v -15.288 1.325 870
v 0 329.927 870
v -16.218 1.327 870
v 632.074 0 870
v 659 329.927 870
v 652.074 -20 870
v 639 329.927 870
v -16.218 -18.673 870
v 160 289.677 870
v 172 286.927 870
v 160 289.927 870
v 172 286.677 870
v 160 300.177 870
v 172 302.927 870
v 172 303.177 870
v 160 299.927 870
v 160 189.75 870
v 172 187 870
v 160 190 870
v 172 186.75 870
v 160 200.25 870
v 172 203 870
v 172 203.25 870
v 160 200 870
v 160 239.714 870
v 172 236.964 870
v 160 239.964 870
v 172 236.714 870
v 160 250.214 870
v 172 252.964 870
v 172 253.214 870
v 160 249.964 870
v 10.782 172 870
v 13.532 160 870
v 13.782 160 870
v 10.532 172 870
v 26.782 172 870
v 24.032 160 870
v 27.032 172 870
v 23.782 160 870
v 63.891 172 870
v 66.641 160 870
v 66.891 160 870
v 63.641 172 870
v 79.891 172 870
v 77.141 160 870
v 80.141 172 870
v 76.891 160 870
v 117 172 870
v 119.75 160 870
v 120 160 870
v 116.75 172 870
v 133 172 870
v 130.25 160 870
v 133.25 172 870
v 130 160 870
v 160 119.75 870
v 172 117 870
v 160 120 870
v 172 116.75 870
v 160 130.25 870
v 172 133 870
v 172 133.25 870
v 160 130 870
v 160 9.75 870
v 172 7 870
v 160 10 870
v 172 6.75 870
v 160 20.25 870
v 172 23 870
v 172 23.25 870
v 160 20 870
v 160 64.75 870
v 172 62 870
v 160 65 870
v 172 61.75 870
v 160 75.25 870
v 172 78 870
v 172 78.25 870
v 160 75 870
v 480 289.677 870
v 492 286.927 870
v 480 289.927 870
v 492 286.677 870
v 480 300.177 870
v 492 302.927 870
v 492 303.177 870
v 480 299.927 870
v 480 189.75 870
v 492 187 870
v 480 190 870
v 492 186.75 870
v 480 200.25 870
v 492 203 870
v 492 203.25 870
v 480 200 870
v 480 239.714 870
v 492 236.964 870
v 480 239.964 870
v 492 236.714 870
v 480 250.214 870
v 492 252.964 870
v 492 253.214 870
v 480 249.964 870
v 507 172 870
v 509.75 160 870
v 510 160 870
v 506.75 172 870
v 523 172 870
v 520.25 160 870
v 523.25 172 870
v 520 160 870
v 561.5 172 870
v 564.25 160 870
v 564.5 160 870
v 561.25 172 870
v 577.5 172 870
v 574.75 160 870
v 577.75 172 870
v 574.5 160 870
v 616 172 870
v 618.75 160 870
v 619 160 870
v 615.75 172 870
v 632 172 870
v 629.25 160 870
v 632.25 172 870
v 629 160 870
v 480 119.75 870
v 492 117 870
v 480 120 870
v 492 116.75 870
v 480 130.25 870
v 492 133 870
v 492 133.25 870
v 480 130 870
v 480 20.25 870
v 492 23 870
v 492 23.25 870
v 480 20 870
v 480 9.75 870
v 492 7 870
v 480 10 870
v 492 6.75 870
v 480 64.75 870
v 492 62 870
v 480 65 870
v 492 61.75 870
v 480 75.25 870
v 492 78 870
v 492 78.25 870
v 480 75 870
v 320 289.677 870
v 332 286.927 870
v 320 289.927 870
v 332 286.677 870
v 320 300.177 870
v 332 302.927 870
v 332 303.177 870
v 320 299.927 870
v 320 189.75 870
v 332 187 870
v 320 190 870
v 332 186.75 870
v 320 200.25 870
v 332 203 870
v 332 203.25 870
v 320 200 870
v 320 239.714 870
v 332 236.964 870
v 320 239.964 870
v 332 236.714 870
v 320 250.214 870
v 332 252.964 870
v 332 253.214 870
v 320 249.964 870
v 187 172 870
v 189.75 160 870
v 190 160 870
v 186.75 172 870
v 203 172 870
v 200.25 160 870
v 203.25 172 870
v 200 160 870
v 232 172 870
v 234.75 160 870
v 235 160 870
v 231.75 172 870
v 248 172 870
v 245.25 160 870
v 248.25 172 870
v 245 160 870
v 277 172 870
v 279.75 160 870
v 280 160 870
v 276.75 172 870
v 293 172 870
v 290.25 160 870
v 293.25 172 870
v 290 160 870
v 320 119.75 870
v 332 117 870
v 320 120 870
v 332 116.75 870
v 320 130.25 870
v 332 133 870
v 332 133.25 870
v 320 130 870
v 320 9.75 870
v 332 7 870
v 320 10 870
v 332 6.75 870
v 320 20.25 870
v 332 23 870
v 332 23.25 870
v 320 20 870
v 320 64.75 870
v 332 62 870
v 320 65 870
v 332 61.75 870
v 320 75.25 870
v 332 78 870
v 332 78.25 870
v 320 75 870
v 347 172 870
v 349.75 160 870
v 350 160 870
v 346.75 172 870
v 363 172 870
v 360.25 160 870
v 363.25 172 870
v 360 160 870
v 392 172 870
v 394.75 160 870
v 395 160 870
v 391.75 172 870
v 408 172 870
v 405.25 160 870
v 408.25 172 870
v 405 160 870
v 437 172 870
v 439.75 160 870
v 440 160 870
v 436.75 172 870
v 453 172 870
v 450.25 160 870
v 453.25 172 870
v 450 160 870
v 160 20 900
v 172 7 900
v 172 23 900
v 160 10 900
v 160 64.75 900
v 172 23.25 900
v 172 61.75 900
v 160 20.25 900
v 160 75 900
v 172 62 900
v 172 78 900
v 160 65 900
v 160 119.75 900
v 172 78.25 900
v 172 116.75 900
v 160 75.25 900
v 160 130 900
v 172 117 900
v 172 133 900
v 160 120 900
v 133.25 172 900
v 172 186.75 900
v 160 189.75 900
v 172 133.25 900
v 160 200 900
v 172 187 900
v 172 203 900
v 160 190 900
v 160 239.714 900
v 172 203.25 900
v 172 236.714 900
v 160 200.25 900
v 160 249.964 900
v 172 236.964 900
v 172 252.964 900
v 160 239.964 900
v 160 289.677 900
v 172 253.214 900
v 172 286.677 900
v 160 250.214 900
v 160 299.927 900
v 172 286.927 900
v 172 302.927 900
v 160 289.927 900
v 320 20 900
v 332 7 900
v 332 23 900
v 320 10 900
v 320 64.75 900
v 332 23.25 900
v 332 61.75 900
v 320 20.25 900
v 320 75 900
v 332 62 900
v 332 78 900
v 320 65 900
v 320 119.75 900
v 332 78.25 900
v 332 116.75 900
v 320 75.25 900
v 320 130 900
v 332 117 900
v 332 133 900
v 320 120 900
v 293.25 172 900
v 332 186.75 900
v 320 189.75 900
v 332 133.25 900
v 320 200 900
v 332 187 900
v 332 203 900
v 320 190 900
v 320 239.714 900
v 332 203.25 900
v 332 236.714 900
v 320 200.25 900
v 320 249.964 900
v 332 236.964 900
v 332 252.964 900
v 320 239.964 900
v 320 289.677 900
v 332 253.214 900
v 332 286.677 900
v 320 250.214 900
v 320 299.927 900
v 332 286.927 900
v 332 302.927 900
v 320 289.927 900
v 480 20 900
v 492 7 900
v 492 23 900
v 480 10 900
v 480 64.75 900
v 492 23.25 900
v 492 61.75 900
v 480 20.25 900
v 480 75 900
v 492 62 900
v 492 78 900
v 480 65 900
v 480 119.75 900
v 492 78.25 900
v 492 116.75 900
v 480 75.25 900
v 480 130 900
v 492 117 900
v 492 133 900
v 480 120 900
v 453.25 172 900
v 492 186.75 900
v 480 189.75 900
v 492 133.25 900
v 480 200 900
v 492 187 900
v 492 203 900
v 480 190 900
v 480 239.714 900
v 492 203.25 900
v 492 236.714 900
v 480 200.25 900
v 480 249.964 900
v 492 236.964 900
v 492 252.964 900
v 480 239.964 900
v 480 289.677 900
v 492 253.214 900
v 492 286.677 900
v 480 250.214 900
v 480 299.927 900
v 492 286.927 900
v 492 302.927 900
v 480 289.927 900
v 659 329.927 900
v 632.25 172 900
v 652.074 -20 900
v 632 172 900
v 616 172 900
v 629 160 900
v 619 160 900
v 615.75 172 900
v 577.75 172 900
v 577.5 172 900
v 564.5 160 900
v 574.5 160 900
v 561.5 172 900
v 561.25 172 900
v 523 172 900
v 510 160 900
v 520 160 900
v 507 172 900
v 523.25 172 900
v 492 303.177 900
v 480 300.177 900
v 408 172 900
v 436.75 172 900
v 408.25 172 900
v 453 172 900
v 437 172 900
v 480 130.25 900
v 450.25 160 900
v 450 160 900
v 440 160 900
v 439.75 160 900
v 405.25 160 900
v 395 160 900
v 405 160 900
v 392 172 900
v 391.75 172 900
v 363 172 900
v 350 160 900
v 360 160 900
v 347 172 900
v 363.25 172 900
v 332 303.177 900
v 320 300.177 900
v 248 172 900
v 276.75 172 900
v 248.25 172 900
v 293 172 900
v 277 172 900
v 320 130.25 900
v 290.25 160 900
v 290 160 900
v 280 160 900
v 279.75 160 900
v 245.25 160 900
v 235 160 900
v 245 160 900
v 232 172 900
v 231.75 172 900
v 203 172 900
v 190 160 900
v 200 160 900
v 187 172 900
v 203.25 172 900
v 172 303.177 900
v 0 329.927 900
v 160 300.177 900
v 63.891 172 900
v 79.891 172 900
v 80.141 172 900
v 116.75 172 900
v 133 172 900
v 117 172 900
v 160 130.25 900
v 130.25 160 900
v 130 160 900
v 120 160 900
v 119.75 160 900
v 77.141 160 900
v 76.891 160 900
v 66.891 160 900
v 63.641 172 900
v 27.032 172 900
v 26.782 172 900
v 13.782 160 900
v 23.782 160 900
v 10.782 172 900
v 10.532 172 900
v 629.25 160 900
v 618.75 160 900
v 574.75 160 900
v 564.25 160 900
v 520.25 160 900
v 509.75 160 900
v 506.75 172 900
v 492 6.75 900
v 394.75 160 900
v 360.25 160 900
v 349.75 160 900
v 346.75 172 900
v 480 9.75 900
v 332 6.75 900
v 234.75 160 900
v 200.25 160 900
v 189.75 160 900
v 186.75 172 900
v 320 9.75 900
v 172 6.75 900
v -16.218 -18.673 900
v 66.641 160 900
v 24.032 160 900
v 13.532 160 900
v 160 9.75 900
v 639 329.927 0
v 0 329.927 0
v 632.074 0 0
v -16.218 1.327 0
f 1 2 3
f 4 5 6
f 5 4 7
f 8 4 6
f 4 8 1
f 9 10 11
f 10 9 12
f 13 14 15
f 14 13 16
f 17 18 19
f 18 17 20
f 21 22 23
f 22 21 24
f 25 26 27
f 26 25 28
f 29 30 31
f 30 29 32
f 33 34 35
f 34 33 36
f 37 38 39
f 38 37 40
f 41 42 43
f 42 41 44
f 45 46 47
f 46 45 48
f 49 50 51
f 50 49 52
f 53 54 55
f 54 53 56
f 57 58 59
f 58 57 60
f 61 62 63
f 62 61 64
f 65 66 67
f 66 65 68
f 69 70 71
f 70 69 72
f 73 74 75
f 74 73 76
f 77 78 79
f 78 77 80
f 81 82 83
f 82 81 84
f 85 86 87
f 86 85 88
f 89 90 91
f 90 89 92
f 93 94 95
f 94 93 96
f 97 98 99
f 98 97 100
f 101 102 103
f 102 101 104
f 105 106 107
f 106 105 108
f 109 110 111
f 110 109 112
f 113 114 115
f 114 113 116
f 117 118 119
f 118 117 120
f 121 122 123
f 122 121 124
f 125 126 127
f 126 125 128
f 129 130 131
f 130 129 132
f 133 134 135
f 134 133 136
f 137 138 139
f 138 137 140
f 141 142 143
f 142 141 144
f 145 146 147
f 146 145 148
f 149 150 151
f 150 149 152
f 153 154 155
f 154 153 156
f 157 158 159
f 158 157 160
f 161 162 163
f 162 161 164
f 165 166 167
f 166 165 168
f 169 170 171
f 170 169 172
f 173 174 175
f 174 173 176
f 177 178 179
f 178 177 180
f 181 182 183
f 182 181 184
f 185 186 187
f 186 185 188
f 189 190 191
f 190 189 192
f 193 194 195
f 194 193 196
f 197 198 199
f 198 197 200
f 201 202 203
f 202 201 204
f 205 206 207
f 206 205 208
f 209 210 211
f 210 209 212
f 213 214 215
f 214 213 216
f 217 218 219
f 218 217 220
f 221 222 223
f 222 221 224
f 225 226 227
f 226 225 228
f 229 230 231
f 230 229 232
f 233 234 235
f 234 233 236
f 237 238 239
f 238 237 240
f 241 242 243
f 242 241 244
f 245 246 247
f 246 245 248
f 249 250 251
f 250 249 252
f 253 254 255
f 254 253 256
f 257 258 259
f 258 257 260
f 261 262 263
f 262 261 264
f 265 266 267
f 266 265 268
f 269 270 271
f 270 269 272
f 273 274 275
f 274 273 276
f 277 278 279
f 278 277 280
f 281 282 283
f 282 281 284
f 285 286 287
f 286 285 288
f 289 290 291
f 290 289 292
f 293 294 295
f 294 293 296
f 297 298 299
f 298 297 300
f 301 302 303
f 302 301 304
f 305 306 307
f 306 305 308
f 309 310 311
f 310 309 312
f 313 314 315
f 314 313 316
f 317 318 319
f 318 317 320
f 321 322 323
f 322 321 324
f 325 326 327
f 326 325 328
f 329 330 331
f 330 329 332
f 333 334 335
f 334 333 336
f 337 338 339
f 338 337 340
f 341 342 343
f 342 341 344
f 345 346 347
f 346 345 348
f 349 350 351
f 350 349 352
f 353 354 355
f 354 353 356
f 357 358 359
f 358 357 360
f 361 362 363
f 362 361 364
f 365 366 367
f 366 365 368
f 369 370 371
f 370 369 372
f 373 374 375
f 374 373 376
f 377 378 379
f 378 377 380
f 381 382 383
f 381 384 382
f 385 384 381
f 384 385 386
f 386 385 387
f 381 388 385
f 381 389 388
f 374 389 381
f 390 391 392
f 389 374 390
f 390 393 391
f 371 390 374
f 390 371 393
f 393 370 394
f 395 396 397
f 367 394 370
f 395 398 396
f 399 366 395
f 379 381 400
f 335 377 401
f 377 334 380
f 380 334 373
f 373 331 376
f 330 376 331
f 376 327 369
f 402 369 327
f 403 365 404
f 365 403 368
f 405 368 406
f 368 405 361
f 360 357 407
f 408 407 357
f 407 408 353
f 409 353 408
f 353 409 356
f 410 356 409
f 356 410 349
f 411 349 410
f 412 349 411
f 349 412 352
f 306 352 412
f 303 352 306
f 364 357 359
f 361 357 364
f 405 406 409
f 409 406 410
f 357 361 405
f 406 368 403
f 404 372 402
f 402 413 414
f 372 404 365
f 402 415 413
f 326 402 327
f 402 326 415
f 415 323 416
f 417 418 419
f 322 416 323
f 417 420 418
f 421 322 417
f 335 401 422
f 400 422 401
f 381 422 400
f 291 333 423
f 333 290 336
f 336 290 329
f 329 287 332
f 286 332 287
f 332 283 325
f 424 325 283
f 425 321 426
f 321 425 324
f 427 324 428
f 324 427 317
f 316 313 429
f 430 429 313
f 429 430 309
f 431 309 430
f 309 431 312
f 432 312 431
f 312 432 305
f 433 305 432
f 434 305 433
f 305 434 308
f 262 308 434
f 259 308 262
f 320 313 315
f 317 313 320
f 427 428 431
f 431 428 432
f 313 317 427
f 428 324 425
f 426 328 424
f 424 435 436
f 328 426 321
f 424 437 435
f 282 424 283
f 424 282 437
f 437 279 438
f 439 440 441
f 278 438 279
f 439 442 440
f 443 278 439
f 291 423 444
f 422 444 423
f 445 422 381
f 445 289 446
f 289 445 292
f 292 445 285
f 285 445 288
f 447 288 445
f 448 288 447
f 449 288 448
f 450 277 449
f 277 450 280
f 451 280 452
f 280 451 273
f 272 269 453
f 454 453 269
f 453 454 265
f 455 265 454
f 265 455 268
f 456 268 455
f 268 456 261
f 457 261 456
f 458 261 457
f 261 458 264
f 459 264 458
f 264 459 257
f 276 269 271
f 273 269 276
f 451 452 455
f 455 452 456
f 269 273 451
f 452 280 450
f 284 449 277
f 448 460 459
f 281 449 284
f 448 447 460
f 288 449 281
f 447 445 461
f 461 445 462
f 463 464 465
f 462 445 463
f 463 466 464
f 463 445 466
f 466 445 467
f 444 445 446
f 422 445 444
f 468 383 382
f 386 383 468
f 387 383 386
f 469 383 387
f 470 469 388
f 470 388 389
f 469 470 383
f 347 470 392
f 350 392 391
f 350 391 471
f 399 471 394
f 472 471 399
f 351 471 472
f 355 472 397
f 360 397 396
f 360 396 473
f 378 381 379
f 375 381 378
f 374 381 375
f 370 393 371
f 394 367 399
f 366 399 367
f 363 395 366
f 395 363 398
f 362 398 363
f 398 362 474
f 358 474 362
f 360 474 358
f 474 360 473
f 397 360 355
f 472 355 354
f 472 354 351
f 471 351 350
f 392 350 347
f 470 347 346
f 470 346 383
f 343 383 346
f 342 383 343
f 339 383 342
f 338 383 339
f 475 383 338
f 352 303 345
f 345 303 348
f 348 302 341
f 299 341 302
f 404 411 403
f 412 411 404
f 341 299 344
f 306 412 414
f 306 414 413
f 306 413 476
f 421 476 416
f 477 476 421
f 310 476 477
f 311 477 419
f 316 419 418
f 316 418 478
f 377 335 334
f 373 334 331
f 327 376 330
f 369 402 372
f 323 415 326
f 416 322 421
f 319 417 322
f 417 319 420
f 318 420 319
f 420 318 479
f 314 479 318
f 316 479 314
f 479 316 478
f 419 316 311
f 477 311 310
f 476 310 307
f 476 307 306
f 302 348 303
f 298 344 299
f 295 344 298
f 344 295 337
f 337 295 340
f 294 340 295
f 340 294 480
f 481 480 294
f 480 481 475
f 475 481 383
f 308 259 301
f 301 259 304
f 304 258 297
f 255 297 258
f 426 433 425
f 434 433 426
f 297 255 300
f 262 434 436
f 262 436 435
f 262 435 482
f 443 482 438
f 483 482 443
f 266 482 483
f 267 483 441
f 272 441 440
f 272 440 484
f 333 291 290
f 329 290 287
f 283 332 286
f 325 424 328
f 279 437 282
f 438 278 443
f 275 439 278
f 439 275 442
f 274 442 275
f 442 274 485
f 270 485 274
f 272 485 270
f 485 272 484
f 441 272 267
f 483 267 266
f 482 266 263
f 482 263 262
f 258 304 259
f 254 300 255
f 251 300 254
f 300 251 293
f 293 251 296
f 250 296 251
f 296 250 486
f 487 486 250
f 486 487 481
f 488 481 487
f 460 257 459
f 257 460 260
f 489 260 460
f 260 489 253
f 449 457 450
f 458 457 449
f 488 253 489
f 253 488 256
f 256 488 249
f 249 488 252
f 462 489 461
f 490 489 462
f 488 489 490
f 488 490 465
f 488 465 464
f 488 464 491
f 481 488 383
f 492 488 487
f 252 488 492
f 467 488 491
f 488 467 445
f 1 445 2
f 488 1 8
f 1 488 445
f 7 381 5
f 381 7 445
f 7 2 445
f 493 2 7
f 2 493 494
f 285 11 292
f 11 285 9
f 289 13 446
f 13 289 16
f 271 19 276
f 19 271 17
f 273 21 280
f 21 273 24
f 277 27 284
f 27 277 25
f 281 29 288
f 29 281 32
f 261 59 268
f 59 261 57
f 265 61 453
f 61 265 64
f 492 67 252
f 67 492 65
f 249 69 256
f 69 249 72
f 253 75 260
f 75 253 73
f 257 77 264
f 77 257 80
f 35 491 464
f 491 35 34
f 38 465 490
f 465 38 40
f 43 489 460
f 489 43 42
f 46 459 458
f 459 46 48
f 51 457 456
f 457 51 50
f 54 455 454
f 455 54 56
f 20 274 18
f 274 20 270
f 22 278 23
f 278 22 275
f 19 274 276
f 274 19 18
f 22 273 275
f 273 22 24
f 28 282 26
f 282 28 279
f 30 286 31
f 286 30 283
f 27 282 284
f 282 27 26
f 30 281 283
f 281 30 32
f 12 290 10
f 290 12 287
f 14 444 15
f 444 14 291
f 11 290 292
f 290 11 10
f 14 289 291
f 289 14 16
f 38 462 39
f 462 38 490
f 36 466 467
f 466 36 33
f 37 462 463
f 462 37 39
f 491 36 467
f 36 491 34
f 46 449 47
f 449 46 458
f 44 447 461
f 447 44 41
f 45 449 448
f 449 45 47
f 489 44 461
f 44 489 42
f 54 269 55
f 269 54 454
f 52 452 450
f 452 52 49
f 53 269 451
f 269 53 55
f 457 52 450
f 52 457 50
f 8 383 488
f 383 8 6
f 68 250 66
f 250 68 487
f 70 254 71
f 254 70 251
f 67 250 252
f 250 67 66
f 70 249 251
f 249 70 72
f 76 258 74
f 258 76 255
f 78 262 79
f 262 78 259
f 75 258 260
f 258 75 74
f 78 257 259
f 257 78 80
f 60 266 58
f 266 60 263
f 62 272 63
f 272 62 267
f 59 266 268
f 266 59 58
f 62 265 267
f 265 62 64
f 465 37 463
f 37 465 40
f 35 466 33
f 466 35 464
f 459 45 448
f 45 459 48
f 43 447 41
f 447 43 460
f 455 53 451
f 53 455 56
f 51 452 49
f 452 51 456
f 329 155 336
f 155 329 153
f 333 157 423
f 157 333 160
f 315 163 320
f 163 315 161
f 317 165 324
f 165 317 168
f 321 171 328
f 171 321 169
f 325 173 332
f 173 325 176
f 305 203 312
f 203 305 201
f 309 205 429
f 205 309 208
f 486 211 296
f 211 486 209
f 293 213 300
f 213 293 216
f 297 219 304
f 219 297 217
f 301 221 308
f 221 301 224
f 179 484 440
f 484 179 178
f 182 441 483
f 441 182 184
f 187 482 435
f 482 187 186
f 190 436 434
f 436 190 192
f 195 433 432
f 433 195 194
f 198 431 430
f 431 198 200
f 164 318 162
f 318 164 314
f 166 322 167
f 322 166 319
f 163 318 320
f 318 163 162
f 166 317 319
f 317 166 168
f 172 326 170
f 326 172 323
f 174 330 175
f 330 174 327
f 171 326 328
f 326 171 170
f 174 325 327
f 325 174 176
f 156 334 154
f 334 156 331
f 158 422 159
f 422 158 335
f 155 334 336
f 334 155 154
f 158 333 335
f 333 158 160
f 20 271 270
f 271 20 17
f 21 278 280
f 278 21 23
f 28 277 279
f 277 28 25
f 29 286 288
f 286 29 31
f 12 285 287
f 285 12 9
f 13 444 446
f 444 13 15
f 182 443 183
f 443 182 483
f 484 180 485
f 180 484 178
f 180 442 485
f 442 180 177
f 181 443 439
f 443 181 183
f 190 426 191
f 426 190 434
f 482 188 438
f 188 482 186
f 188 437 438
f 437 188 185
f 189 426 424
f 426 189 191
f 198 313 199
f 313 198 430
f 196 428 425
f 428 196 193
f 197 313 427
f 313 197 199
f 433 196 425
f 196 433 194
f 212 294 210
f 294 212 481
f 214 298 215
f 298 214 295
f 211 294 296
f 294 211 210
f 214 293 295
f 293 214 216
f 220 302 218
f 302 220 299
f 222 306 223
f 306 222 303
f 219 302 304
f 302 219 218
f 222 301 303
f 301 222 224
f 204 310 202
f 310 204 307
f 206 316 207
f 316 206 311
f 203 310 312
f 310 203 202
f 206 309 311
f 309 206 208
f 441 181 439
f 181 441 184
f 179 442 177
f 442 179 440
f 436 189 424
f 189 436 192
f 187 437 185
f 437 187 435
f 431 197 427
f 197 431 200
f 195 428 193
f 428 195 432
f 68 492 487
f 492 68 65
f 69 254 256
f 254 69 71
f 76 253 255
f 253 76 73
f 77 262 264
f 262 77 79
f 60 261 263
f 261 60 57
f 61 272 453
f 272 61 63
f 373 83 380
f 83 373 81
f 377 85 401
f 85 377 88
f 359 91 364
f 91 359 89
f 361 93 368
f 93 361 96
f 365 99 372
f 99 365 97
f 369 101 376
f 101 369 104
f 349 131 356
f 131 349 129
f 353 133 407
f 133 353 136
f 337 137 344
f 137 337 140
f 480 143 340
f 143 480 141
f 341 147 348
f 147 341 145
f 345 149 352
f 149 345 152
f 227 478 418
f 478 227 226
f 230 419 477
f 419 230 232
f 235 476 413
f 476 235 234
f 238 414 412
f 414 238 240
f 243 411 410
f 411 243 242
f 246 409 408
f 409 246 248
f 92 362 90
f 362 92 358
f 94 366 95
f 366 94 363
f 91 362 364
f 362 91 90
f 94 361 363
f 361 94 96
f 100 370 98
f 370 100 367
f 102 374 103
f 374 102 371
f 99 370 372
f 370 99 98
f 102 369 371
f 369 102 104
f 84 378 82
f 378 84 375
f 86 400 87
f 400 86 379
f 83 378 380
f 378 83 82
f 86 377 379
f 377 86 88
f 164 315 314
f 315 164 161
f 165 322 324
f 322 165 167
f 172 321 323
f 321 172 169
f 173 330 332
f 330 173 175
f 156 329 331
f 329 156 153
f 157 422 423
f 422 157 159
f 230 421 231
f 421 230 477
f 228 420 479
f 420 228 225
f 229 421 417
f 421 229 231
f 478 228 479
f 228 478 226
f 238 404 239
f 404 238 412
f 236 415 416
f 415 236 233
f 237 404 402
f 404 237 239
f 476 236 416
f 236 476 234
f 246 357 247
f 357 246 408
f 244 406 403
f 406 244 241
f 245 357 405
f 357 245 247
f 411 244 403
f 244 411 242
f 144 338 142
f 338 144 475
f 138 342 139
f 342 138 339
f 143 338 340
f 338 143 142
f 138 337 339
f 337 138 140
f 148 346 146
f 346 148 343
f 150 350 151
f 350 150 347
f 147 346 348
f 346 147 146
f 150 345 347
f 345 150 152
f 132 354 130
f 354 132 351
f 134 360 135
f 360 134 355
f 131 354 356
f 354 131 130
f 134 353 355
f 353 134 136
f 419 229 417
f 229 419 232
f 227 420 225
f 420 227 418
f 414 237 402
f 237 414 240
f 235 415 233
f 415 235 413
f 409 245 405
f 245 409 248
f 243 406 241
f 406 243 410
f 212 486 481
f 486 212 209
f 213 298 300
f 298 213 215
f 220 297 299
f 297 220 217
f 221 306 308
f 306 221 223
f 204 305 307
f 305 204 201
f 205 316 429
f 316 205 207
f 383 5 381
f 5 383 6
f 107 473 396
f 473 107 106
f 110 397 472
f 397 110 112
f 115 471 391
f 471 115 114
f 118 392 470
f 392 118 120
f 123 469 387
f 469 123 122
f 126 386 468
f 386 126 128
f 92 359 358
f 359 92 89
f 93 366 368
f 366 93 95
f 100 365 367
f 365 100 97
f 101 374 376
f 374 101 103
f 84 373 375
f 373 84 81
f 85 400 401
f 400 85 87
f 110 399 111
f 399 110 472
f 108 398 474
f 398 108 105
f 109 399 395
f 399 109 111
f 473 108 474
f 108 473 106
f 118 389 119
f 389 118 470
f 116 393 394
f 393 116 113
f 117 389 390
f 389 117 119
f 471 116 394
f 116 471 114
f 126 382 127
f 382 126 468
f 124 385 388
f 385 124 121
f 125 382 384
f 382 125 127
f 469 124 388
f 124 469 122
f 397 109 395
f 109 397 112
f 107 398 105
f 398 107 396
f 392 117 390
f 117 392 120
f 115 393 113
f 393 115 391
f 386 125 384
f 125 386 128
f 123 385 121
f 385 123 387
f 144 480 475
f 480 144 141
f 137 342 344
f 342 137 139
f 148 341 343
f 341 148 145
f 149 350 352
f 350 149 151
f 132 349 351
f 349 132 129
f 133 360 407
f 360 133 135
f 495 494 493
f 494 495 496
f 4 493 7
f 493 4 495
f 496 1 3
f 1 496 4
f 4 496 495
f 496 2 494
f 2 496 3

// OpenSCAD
$fn = 50;

// ── Measured dimensions (mm) ──────────────────────────────────────────────────
back_width     = 639;   // back wall: BL → BR
right_side     = 330;   // right wall: BR → FR
left_side      = 329;   // left wall:  FL → BL
cabinet_height = 870;

// Cross-diagonal measurements — fully define the shape together with the sides
diag_bl_fr = 713;       // back-left  → front-right
diag_fl_br = 733;       // front-left → back-right

overhang_right = 20;
overhang_front = 20;

// ── Analytically derived corner positions ─────────────────────────────────────
// Solved from side lengths + diagonals via circle intersections.
// Right side leans ~7mm inward over 330mm (not perpendicular).

// x-positions of front corners
FR_x = (pow(diag_bl_fr,2) - pow(right_side,2) + pow(back_width,2)) / (2*back_width); // ≈ 632
FL_x = (pow(left_side,2)  + pow(back_width,2) - pow(diag_fl_br,2)) / (2*back_width); // ≈ -16

// Back wall y-level (= right side length projected to y-axis)
back_y = sqrt(pow(diag_bl_fr,2) - pow(FR_x,2));  // ≈ 330

// Front-left y position (slightly above 0 due to left-wall angle)
FL_y = back_y - sqrt(pow(left_side,2) - pow(FL_x,2));  // ≈ 1.3

// ── Print mode ────────────────────────────────────────────────────────────────
// Set print_mode = true to export a single flat piece (thin, no cabinet/walls).
// Set piece = 1–8 to select which piece to export.
//
// Piece layout (top view, back wall at top, left wall at left):
//
//   back wall
//   ┌──────────────────────────────────────────┐
//   │ back-left  │ back-ctr-L │ back-ctr-R │ back-right  │
//   │    (1)     │    (2)     │    (3)     │    (4)      │
//   ├────────────┼────────────┼────────────┼─────────────┤
//   │ front-left │ front-ctr-L│ front-ctr-R│ front-right │
//   │    (5)     │    (6)     │    (7)     │    (8)      │
//   └──────────────────────────────────────────┘
//   front (overhang)

print_mode = false;
piece      = 1;

top_thickness = print_mode ? 1.88 : 30;  // 1.88 = 0.20 first layer + 6 × 0.28mm

// ── Coordinate system ─────────────────────────────────────────────────────────
// y=0 is the cabinet front edge; positive y goes toward the back wall.
// In OpenSCAD top view (press 2): back wall at top, front at bottom.

X_MIN = FL_x;                           // leftmost point (front-left ≈ -16)
X_MAX = back_width + overhang_right;    // rightmost point: back-right (659) > front-right (652)
Y_MIN = -overhang_front;                // front edge (with overhang)
Y_MAX = back_y;                         // back wall y level (~330)

// ── Cut positions ─────────────────────────────────────────────────────────────
// 3 vertical cuts → 4 columns (all ≤ 180mm wide, fits 220×220mm bed)
// 1 horizontal cut → 2 rows (≤ 180mm tall each)
CUT_X = [160, 320, 480];
CUT_Y = 160;

function col_x0(c) = (c == 1) ? X_MIN : CUT_X[c-2];
function col_x1(c) = (c == 4) ? X_MAX : CUT_X[c-1];
function row_y0(r) = (r == 2) ? Y_MIN : CUT_Y;
function row_y1(r) = (r == 2) ? CUT_Y : Y_MAX;

// ── Dovetail parameters ───────────────────────────────────────────────────────
dt_narrow = 10;   // width at base (mm)
dt_wide   = 16;   // width at tip  (mm)
dt_depth  = 12;   // protrusion depth (mm)
dt_tol    = 0.25; // extra clearance on female socket

// Male pointing in +x from (cx, cy)
module dt_male_x(cx, cy, h) {
  linear_extrude(h)
  polygon([
    [cx,            cy - dt_narrow/2],
    [cx + dt_depth, cy - dt_wide/2  ],
    [cx + dt_depth, cy + dt_wide/2  ],
    [cx,            cy + dt_narrow/2],
  ]);
}

// Female socket matching a +x male at (cx, cy)
module dt_female_x(cx, cy, h) {
  translate([0, 0, -0.05])
  linear_extrude(h + 0.1)
  polygon([
    [cx,            cy - dt_narrow/2 - dt_tol],
    [cx + dt_depth, cy - dt_wide/2   - dt_tol],
    [cx + dt_depth, cy + dt_wide/2   + dt_tol],
    [cx,            cy + dt_narrow/2 + dt_tol],
  ]);
}

// Male pointing in +y from (cx, cy)
module dt_male_y(cx, cy, h) {
  linear_extrude(h)
  polygon([
    [cx - dt_narrow/2, cy          ],
    [cx - dt_wide/2,   cy + dt_depth],
    [cx + dt_wide/2,   cy + dt_depth],
    [cx + dt_narrow/2, cy          ],
  ]);
}

// Female socket matching a +y male at (cx, cy)
module dt_female_y(cx, cy, h) {
  translate([0, 0, -0.05])
  linear_extrude(h + 0.1)
  polygon([
    [cx - dt_narrow/2 - dt_tol, cy          ],
    [cx - dt_wide/2   - dt_tol, cy + dt_depth],
    [cx + dt_wide/2   + dt_tol, cy + dt_depth],
    [cx + dt_narrow/2 + dt_tol, cy          ],
  ]);
}

// ── Top panel 2D footprint ────────────────────────────────────────────────────
module top_2d() {
  polygon([
    [0,                    back_y          ],  // back-left  (flush to walls)
    [back_width + overhang_right, back_y  ],  // back-right (right overhang)
    [FR_x + overhang_right, Y_MIN         ],  // front-right (right + front overhang)
    [FL_x,                 FL_y + Y_MIN   ],  // front-left  (front overhang only)
  ]);
}

module top_solid() {
  linear_extrude(height = top_thickness) top_2d();
}

// ── Single piece ──────────────────────────────────────────────────────────────
// Vertical joints: left column gets male (+x), right column gets female socket.
// Horizontal joint: front row (row 2) gets male (+y), back row (row 1) gets female.
module make_piece(col, row) {
  x0 = col_x0(col);  x1 = col_x1(col);
  y0 = row_y0(row);  y1 = row_y1(row);
  h  = top_thickness;

  // 3 dovetails evenly spaced along each joint edge
  dt_ys = [y0 + 35, (y0 + y1) / 2, y1 - 35];
  dt_xs = [x0 + 35, (x0 + x1) / 2, x1 - 35];

  difference() {
    union() {
      // Base: full top shape clipped to this piece's bounding box
      intersection() {
        top_solid();
        translate([x0, y0, -0.05])
          cube([x1 - x0, y1 - y0, h + 0.1]);
      }
      // Males added after intersection so they extend beyond the bbox
      if (col < 4) for (dy = dt_ys) dt_male_x(x1, dy, h);  // right edge
      if (row == 2) for (dx = dt_xs) dt_male_y(dx, CUT_Y, h);  // top edge
    }
    // Female sockets cut into this piece
    if (col > 1) for (dy = dt_ys) dt_female_x(x0, dy, h);  // left edge
    if (row == 1) for (dx = dt_xs) dt_female_y(dx, CUT_Y, h);  // bottom edge
  }
}

// ── Scene ─────────────────────────────────────────────────────────────────────

if (print_mode) {

  // Single flat piece ready to slice and print
  col = ((piece - 1) % 4) + 1;
  row = floor((piece - 1) / 4) + 1;
  make_piece(col, row);

} else {

  // Cabinet body
  color("burlywood")
  linear_extrude(height = cabinet_height)
    polygon([
      [0,          back_y],
      [back_width, back_y],
      [FR_x,       0     ],
      [FL_x,       FL_y  ],
    ]);

  // Top panel (all 8 pieces assembled)
  color("black")
  translate([0, 0, cabinet_height])
    for (c = [1:4]) for (r = [1:2])
      make_piece(c, r);

  // Wall visualization (ghost — not exported)
  wall_h  = cabinet_height + top_thickness + 50;
  wall_t  = 15;
  wall_hl = 400;

  % color("steelblue") {
    // Back wall
    translate([-wall_hl, left_side, 0])
      cube([X_MAX + wall_hl, wall_t, wall_h]);
    // Left angled section
    linear_extrude(height = wall_h)
      polygon([
        [0,             back_y],
        [FL_x,          FL_y  ],
        [FL_x - wall_t, FL_y  ],
        [-wall_t,       back_y],
      ]);
    // Left horizontal section
    translate([FL_x - wall_hl, FL_y, 0])
      cube([wall_hl, wall_t, wall_h]);
  }

}
